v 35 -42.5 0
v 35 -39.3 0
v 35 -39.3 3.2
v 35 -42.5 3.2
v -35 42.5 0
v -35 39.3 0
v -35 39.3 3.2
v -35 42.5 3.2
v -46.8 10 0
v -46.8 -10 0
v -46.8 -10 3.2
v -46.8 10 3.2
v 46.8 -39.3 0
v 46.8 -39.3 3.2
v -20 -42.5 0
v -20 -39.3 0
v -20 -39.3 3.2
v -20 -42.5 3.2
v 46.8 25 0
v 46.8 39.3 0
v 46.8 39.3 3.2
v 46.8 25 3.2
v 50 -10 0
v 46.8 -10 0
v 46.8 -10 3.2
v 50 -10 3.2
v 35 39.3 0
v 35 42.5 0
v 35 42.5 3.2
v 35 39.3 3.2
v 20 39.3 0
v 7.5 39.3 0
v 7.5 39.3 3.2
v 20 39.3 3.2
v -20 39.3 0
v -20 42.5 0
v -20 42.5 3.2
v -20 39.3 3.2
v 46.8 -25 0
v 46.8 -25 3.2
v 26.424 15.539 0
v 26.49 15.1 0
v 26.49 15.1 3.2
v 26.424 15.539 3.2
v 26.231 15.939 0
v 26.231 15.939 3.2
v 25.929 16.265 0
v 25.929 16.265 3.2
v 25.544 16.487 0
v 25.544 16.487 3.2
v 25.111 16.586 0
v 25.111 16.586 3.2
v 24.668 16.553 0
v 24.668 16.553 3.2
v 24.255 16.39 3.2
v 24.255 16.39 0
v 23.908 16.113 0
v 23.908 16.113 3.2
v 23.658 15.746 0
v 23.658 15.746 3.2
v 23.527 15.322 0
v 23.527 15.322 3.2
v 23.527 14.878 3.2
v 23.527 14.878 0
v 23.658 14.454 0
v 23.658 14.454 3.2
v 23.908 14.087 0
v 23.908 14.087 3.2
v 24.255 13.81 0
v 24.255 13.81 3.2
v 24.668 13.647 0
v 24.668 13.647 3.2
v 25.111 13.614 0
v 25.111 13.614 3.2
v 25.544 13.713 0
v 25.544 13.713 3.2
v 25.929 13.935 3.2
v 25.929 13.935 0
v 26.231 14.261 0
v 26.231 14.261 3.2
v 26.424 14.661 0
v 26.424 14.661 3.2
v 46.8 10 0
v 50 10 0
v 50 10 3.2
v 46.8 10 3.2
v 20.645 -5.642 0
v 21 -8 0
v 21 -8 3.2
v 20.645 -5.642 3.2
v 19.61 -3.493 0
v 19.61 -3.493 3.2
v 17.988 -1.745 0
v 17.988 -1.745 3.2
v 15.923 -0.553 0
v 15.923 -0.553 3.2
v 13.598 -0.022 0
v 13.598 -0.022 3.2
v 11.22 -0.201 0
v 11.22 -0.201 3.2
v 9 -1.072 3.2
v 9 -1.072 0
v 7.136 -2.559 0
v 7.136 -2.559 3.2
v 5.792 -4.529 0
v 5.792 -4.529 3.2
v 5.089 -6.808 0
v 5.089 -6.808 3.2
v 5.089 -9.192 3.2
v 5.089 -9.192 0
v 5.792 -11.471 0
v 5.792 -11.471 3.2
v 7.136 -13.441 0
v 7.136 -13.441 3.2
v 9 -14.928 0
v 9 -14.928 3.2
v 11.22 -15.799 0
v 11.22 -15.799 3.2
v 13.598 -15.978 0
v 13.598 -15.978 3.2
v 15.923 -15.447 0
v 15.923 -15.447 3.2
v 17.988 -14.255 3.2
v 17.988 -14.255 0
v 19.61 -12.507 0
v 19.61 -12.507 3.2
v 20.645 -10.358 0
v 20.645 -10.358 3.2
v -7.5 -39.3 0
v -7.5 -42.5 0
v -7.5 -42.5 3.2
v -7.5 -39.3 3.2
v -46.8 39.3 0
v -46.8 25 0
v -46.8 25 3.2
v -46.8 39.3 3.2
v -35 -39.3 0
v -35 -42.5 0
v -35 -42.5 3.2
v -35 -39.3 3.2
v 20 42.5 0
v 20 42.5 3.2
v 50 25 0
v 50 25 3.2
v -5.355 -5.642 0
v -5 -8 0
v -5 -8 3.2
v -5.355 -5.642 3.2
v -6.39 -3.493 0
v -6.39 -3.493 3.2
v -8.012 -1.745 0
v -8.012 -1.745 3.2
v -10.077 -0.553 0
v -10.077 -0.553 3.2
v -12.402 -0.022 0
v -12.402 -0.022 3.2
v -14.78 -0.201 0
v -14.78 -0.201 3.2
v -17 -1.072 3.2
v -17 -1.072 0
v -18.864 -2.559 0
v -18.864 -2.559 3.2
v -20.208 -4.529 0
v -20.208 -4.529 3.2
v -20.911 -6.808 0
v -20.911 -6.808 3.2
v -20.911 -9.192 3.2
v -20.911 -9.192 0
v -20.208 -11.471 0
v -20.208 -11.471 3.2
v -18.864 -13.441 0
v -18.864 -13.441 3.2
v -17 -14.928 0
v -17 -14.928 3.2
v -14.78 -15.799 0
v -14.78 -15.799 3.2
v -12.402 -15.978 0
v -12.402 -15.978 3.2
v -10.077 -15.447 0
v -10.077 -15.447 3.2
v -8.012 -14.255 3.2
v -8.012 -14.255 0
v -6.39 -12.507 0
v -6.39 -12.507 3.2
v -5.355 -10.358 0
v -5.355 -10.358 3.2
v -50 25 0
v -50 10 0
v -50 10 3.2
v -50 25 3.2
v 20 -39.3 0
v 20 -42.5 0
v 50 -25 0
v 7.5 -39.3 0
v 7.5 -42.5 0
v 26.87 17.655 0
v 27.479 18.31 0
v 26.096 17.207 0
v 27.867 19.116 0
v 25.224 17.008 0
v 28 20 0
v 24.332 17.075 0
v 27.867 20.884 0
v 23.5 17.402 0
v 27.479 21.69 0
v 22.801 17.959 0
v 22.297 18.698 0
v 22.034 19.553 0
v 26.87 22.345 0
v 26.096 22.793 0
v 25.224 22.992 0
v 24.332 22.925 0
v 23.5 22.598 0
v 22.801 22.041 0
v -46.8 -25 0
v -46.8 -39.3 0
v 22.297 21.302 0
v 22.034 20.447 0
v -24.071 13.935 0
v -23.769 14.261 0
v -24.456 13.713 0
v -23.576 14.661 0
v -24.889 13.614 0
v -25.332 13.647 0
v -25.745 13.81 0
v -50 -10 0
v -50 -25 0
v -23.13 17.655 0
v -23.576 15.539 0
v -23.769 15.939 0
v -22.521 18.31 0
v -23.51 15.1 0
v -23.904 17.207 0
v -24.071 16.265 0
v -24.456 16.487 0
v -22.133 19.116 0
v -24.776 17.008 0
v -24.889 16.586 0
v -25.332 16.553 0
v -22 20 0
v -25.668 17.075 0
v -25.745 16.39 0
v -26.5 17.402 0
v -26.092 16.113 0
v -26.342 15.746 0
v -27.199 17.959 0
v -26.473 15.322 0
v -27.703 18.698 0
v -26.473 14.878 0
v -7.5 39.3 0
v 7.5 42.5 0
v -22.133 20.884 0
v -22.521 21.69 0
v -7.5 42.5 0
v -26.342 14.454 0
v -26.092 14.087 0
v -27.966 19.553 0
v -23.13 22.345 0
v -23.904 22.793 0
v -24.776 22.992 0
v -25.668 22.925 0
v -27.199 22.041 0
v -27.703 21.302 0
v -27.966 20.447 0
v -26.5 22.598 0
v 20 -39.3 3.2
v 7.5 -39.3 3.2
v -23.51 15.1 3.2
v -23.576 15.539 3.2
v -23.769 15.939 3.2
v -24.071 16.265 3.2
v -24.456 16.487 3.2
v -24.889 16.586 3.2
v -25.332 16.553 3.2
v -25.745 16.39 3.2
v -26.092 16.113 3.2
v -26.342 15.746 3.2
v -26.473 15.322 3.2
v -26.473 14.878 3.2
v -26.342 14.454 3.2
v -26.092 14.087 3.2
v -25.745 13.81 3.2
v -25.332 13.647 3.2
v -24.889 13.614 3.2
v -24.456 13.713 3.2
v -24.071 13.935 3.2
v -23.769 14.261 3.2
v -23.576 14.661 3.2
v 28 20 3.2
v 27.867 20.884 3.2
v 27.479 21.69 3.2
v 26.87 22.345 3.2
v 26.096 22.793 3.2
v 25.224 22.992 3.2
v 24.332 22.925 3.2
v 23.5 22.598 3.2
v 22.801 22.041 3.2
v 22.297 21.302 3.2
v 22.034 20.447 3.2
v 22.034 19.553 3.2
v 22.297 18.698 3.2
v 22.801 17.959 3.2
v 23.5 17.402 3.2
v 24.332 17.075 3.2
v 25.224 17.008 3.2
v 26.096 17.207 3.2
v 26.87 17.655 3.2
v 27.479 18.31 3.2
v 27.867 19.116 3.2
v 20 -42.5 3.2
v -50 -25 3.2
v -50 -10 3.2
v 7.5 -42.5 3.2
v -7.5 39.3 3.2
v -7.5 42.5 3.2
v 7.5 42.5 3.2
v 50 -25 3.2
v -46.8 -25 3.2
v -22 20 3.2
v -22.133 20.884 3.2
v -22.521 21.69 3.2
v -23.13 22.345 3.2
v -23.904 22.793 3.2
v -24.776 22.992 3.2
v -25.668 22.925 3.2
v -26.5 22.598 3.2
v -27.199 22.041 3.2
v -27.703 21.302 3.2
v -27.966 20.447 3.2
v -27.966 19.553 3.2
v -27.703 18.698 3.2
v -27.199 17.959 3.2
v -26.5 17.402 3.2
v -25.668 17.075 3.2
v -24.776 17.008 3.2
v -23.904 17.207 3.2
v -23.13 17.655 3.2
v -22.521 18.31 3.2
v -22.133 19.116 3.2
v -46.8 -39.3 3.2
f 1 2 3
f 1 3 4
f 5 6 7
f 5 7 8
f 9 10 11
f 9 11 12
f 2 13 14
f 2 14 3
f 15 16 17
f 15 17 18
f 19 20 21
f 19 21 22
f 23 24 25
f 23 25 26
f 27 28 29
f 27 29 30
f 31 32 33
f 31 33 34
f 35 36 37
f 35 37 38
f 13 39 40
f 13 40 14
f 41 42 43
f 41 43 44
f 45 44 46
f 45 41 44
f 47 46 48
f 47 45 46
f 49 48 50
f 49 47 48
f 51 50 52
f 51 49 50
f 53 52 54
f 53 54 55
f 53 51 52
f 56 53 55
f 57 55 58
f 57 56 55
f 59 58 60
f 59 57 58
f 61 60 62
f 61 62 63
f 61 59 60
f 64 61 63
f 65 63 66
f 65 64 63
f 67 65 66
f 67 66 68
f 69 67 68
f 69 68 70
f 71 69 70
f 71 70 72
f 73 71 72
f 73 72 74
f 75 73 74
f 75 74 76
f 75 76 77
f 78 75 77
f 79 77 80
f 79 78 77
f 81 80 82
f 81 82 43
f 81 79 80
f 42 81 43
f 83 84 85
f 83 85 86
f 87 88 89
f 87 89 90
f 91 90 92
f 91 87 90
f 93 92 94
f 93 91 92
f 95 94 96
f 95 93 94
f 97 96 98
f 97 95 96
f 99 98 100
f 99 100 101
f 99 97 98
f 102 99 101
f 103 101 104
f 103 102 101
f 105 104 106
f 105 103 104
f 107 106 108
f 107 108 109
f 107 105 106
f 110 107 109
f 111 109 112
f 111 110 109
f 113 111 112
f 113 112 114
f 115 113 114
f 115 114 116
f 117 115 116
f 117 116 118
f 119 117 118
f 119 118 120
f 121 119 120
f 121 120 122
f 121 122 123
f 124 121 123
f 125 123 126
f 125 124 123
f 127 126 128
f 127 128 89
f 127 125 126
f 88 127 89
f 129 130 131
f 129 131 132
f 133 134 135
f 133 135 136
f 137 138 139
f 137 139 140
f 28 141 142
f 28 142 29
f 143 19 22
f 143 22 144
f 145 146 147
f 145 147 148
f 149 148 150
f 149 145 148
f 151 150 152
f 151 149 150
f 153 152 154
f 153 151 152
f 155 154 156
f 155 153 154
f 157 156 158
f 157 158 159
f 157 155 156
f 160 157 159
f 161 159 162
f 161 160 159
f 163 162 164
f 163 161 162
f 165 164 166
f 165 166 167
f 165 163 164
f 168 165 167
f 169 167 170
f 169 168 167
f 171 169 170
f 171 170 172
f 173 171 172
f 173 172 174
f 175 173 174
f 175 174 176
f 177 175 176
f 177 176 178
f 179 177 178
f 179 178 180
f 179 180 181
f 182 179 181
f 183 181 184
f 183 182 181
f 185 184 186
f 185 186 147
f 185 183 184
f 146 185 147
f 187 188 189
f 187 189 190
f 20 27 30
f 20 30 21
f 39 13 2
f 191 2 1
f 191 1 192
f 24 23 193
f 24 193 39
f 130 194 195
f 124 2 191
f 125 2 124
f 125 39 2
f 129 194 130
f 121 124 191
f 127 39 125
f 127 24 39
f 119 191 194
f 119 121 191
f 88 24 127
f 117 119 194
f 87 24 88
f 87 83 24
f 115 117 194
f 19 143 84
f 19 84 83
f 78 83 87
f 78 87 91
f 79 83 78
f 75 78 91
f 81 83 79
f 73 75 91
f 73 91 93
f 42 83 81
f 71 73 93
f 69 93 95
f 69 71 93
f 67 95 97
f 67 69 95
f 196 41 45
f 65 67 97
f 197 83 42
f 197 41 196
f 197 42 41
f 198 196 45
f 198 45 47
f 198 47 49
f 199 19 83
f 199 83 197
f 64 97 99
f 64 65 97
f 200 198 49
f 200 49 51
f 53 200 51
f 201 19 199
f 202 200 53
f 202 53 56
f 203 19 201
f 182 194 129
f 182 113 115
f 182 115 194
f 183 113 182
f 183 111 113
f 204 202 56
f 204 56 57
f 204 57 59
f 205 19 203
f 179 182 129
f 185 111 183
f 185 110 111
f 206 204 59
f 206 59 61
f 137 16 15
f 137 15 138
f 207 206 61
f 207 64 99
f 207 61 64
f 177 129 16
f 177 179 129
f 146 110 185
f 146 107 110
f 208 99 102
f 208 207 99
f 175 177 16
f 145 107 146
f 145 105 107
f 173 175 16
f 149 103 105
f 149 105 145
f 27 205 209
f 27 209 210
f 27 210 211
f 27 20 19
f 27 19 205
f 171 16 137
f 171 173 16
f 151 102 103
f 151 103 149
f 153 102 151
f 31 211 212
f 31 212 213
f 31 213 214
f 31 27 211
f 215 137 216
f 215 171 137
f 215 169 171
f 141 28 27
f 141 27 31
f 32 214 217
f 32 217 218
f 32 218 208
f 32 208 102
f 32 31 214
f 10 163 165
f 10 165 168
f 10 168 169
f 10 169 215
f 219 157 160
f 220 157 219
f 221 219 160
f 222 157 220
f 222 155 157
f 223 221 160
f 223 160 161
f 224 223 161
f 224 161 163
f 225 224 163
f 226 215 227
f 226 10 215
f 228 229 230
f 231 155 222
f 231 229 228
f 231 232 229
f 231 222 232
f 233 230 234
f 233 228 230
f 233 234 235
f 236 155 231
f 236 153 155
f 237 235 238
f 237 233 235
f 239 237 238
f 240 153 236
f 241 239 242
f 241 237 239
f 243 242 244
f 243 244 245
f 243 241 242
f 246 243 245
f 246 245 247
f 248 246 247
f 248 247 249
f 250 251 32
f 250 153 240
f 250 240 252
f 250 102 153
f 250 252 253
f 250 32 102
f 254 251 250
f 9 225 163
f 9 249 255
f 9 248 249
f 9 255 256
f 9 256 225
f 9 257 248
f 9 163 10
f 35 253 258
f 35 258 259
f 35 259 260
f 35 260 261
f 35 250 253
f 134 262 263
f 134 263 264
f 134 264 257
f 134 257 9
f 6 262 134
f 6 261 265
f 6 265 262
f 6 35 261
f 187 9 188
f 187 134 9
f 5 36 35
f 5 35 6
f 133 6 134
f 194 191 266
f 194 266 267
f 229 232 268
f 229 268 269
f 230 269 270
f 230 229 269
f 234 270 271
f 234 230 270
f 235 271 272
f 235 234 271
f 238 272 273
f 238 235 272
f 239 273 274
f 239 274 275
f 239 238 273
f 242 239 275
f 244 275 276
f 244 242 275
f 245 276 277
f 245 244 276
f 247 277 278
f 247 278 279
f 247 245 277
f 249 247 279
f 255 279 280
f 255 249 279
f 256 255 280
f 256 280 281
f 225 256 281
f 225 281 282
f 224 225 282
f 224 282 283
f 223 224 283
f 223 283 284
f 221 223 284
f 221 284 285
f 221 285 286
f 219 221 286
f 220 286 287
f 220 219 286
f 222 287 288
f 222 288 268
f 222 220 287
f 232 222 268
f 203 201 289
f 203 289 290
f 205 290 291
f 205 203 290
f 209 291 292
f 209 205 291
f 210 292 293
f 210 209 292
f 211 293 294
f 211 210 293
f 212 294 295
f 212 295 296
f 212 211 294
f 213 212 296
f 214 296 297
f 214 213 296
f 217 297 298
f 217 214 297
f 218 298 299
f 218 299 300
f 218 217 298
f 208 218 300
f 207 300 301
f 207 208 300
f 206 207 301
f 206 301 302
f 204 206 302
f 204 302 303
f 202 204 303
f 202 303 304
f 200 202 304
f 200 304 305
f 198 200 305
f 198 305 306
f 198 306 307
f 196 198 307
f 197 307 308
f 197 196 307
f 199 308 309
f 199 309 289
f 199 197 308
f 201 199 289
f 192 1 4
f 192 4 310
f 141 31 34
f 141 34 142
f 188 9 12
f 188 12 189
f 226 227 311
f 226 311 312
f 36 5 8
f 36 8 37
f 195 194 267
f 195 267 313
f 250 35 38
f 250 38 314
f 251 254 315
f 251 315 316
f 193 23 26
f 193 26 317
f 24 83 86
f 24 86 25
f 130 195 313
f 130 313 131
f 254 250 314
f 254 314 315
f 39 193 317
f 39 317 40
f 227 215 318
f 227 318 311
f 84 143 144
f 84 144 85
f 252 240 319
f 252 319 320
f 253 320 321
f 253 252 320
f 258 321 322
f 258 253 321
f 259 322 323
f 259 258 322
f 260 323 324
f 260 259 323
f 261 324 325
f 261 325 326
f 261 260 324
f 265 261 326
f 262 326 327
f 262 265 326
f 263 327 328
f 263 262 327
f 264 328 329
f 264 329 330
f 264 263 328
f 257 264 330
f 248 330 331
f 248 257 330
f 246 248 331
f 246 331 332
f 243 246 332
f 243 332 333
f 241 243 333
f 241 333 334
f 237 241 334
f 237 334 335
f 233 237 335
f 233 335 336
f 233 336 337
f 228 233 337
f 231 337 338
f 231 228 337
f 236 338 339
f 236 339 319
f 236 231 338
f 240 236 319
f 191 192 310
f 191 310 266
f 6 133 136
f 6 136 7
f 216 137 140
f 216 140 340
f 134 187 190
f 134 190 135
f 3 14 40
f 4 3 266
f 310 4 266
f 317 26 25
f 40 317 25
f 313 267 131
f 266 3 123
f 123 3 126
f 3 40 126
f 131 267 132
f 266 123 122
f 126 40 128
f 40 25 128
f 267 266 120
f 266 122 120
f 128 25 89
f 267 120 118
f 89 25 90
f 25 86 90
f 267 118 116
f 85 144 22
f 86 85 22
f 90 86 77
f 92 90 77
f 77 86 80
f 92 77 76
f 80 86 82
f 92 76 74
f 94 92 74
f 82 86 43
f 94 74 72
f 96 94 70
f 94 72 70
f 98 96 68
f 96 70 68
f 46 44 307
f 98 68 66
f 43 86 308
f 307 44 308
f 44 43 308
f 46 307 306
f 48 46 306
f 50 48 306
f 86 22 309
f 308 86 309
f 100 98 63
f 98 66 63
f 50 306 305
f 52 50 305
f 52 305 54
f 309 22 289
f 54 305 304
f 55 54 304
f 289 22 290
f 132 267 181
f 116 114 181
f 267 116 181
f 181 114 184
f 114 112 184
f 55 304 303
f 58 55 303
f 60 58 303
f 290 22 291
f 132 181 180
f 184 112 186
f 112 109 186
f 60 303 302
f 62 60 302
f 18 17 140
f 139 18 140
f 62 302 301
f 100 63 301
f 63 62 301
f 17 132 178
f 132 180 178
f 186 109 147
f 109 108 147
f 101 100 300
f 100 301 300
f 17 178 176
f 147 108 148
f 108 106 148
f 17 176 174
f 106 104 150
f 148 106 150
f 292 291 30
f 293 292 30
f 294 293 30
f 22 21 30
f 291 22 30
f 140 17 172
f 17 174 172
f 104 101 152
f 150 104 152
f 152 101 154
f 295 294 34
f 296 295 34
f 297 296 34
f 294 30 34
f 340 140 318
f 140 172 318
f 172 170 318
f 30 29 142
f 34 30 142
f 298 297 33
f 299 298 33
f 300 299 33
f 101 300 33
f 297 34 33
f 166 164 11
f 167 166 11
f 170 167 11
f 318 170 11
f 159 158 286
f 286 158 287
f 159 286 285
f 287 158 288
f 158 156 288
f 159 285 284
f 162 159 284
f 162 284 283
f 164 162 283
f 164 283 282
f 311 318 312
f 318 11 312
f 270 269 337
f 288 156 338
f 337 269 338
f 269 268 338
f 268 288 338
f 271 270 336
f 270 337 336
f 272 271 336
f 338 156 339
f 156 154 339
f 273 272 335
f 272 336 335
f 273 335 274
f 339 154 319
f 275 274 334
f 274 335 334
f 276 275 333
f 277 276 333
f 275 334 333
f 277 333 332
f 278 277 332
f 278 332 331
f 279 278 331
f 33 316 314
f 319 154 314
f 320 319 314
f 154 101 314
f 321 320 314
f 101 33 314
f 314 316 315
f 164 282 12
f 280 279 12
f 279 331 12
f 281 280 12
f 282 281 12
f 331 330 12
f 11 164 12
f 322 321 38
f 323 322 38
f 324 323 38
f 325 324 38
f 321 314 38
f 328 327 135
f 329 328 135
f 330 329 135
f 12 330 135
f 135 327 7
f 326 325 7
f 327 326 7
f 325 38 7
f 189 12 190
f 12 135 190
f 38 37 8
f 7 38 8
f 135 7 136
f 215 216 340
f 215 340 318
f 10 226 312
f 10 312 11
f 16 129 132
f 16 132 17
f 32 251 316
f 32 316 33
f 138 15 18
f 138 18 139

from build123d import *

# Parameters (mm, degrees)
SKETCH1_R           = 8
SKETCH1_R_2         = 3
SKETCH1_R_3         = 1.49
BOSS_EXTRUDE1_DEPTH = 3.2


with BuildPart() as part:
    # Sketch1 → Boss-Extrude1 (new body)
    with BuildSketch(Plane.XY):
        Polygon((-50, 10), (-50, 25), (-46.8, 25), (-46.8, 39.3), (-35, 39.3), (-35, 42.5), (-20, 42.5), (-20, 39.3), (-7.5, 39.3), (-7.5, 42.5), (7.5, 42.5), (7.5, 39.3), (20, 39.3), (20, 42.5), (35, 42.5), (35, 39.3), (46.8, 39.3), (46.8, 25), (50, 25), (50, 10), (46.8, 10), (46.8, -10), (50, -10), (50, -25), (46.8, -25), (46.8, -39.3), (35, -39.3), (35, -42.5), (20, -42.5), (20, -39.3), (7.5, -39.3), (7.5, -42.5), (-7.5, -42.5), (-7.5, -39.3), (-20, -39.3), (-20, -42.5), (-35, -42.5), (-35, -39.3), (-46.8, -39.3), (-46.8, -25), (-50, -25), (-50, -10), (-46.8, -10), (-46.8, 10), align=None)
        with Locations((-13, -8)):
            Circle(SKETCH1_R, mode=Mode.SUBTRACT)
        with Locations((-25, 20)):
            Circle(SKETCH1_R_2, mode=Mode.SUBTRACT)
        with Locations((-25, 15.1)):
            Circle(SKETCH1_R_3, mode=Mode.SUBTRACT)
        with Locations((13, -8)):
            Circle(SKETCH1_R, mode=Mode.SUBTRACT)
        with Locations((25, 15.1)):
            Circle(SKETCH1_R_3, mode=Mode.SUBTRACT)
        with Locations((25, 20)):
            Circle(SKETCH1_R_2, mode=Mode.SUBTRACT)
    extrude(amount=BOSS_EXTRUDE1_DEPTH)


solid = part.part
